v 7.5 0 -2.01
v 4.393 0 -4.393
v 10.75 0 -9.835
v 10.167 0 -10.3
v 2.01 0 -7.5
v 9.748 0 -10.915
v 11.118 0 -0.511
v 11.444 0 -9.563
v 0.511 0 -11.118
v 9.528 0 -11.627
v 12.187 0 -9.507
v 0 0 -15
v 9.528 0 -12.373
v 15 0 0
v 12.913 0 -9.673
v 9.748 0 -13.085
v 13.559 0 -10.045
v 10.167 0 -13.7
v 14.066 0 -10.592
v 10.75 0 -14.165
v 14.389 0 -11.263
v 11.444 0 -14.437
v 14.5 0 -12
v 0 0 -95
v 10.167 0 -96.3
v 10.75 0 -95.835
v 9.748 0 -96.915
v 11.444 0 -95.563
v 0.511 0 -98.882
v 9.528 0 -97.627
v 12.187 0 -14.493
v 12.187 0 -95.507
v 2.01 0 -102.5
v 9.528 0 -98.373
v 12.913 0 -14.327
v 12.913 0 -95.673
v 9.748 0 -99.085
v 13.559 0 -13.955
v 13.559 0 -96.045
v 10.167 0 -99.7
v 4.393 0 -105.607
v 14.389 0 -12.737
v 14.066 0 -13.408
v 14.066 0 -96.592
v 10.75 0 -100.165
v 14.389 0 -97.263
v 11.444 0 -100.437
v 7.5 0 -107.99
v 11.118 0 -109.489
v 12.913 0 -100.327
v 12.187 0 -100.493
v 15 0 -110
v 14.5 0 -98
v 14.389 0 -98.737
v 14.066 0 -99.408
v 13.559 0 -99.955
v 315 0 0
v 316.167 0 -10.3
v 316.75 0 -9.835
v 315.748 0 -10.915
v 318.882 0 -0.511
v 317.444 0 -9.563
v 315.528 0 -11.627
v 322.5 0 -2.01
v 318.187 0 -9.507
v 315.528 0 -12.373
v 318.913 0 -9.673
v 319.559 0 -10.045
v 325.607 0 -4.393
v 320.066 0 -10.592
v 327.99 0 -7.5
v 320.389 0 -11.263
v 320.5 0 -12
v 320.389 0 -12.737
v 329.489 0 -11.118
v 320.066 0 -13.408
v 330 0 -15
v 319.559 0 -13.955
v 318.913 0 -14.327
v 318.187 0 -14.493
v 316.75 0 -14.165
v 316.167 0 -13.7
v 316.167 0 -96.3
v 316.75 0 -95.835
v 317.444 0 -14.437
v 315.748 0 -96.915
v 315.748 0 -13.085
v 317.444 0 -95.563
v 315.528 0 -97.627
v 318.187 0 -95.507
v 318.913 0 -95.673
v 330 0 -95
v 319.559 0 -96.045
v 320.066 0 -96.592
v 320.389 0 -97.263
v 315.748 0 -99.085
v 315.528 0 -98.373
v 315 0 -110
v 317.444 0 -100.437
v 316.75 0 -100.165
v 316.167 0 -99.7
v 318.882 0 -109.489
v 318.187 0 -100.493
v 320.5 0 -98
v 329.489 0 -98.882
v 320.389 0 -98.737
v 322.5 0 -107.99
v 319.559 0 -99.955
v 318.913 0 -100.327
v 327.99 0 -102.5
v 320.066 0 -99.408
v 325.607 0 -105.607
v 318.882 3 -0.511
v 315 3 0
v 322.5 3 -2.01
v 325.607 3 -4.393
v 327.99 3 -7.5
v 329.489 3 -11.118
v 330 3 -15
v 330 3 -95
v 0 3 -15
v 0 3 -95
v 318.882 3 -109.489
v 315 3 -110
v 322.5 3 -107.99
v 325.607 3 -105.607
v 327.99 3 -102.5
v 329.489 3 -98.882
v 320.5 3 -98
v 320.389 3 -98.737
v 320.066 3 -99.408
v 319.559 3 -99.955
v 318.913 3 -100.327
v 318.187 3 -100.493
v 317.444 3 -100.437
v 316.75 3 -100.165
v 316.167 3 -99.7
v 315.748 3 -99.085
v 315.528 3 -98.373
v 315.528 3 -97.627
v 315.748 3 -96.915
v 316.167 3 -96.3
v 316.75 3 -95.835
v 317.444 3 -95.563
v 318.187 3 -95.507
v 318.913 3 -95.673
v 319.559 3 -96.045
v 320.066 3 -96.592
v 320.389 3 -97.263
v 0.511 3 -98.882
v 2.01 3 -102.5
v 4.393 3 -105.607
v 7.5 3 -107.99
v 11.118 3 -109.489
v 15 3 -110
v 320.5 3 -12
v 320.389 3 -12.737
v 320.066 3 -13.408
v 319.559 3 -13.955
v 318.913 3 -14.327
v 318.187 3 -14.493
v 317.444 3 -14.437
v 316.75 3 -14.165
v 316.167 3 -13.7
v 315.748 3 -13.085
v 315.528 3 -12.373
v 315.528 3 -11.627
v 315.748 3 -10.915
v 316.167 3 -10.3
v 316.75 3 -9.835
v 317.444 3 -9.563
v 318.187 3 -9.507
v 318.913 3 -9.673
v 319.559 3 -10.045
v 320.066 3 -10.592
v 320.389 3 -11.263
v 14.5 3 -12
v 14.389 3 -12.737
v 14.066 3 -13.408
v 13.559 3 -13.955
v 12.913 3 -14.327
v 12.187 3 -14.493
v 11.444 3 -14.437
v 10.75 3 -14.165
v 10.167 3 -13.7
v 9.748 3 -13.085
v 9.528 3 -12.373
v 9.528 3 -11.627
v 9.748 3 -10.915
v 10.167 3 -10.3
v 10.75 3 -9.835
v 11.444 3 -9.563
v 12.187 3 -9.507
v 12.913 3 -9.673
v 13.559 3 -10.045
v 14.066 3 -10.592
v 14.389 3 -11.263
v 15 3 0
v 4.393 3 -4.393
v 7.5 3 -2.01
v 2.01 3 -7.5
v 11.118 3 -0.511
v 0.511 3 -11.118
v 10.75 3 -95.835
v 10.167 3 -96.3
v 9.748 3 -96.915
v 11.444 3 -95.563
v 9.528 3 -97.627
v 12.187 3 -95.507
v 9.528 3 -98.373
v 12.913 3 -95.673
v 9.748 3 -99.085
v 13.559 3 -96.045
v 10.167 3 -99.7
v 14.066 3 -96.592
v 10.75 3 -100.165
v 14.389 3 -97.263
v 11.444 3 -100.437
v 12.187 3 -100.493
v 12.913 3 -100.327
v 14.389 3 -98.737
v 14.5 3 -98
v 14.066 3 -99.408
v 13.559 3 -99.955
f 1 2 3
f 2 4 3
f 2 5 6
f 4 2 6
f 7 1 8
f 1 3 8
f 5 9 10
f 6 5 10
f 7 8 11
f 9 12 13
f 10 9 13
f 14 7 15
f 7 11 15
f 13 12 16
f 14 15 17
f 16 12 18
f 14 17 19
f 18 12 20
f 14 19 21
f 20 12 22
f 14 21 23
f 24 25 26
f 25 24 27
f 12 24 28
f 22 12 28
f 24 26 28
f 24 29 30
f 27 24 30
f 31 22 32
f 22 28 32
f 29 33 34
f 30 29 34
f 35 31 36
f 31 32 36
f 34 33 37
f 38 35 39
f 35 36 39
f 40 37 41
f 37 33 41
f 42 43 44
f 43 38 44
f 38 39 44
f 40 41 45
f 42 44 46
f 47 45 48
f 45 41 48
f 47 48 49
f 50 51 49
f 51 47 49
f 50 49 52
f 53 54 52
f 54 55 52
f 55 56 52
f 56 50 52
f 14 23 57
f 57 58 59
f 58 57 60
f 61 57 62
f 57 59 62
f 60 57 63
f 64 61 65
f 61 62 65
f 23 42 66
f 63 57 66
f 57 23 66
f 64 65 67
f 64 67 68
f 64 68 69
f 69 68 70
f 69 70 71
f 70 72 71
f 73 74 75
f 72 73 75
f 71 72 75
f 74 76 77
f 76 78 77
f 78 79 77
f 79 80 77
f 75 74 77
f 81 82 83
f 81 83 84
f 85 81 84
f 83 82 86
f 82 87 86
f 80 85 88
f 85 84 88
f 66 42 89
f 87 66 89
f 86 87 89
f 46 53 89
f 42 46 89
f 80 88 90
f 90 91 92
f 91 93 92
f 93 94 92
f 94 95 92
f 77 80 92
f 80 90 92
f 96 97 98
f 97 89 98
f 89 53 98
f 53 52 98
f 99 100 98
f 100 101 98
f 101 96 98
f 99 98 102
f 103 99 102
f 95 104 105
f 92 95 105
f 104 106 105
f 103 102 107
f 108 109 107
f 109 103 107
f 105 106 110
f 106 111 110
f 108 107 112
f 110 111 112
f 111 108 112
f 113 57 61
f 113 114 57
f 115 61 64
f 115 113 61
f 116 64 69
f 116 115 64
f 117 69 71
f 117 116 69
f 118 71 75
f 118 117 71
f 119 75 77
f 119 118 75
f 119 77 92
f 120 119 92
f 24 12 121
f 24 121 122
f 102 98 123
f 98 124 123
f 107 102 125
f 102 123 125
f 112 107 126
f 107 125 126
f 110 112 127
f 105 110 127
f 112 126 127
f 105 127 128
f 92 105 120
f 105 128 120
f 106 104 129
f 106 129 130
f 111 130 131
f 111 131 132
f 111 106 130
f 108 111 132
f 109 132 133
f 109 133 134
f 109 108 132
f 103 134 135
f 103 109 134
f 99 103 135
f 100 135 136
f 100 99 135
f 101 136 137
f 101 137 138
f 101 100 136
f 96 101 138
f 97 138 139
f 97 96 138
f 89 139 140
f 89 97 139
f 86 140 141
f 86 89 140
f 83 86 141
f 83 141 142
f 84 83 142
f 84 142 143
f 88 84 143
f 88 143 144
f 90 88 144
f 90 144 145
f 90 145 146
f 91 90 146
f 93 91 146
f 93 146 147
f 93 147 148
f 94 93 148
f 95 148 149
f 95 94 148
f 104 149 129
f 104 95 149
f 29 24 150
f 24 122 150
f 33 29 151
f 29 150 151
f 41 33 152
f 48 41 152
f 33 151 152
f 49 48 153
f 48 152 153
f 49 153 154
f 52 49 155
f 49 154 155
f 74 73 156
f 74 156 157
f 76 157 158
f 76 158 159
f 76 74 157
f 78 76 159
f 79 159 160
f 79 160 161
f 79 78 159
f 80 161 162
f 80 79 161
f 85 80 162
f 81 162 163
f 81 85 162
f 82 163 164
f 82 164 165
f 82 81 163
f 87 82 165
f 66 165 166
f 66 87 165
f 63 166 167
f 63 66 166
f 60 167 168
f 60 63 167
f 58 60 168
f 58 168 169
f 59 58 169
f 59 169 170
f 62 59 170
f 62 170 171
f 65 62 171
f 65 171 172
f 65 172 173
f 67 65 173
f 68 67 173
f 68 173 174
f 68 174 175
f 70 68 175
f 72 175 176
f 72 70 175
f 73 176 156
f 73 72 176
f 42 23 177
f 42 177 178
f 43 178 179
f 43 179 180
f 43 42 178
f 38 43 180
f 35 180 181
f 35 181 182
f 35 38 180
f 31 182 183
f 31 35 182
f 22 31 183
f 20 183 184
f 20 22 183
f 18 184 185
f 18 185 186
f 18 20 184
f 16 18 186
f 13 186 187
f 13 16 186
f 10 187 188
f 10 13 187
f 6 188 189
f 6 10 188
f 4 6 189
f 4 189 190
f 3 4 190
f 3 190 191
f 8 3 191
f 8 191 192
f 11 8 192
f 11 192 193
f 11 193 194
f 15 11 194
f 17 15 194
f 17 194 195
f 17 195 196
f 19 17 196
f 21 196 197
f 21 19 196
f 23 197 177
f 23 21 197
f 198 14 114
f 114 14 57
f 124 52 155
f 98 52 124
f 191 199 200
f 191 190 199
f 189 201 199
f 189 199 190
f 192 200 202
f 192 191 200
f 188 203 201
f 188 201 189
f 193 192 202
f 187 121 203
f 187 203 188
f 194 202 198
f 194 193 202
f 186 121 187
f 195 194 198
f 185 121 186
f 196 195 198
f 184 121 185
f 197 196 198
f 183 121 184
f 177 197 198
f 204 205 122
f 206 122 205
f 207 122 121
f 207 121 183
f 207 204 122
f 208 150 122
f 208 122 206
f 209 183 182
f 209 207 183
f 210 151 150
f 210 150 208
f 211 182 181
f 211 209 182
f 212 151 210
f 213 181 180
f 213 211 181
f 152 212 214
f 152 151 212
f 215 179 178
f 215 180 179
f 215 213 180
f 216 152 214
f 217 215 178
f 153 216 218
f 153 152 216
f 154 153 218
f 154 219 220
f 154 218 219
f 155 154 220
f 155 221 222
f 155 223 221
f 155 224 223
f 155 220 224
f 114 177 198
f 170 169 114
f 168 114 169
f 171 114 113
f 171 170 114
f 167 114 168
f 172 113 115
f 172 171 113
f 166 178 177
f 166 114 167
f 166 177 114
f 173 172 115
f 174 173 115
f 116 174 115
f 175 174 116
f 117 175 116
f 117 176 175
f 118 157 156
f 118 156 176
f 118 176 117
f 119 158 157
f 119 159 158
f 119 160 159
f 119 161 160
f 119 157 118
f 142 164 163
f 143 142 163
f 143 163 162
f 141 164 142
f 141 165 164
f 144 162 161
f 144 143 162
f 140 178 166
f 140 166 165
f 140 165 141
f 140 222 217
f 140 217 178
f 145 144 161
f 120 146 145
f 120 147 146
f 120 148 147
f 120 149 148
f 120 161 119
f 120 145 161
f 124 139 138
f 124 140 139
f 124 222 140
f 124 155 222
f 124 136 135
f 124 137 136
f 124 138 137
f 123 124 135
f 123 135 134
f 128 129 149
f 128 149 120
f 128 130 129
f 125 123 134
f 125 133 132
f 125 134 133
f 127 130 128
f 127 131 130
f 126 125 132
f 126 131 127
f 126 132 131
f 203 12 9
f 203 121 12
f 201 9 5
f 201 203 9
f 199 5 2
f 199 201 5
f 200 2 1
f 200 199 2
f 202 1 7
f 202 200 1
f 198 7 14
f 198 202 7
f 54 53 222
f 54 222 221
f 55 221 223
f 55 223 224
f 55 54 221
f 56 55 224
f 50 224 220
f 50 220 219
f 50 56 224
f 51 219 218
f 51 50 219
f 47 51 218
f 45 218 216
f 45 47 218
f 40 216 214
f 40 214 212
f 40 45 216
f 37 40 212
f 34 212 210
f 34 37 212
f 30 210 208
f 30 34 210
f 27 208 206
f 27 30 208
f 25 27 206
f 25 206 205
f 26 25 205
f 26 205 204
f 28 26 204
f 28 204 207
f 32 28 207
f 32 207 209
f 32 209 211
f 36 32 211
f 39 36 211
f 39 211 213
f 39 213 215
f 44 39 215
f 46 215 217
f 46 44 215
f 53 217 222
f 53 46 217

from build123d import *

# Parameters (mm, degrees)
ESQUISSE1_W      = 330
ESQUISSE1_H      = 110
ESQUISSE1_R      = 2.5
EXTRUSION1_DEPTH = 3
CONG_2_R         = 15


with BuildPart() as part:
    # Esquisse1 → Extrusion1 (new body)
    with BuildSketch(Plane(origin=(0, 0, 0), x_dir=(1, 0, 0), z_dir=(0, 1, 0))):
        with Locations((165, 55)):
            Rectangle(ESQUISSE1_W, ESQUISSE1_H)
        with Locations((12, 98)):
            Circle(ESQUISSE1_R, mode=Mode.SUBTRACT)
        with Locations((318, 98)):
            Circle(ESQUISSE1_R, mode=Mode.SUBTRACT)
        with Locations((318, 12)):
            Circle(ESQUISSE1_R, mode=Mode.SUBTRACT)
        with Locations((12, 12)):
            Circle(ESQUISSE1_R, mode=Mode.SUBTRACT)
    extrude(amount=EXTRUSION1_DEPTH)

    # Congé2
    cong_2_edges = [part.edges().sort_by_distance(p)[0] for p in [
        (0, 1.5, -110),
        (330, 1.5, -110),
        (330, 1.5, 0),
        (0, 1.5, 0),
    ]]
    fillet(cong_2_edges, radius=CONG_2_R)


solid = part.part
